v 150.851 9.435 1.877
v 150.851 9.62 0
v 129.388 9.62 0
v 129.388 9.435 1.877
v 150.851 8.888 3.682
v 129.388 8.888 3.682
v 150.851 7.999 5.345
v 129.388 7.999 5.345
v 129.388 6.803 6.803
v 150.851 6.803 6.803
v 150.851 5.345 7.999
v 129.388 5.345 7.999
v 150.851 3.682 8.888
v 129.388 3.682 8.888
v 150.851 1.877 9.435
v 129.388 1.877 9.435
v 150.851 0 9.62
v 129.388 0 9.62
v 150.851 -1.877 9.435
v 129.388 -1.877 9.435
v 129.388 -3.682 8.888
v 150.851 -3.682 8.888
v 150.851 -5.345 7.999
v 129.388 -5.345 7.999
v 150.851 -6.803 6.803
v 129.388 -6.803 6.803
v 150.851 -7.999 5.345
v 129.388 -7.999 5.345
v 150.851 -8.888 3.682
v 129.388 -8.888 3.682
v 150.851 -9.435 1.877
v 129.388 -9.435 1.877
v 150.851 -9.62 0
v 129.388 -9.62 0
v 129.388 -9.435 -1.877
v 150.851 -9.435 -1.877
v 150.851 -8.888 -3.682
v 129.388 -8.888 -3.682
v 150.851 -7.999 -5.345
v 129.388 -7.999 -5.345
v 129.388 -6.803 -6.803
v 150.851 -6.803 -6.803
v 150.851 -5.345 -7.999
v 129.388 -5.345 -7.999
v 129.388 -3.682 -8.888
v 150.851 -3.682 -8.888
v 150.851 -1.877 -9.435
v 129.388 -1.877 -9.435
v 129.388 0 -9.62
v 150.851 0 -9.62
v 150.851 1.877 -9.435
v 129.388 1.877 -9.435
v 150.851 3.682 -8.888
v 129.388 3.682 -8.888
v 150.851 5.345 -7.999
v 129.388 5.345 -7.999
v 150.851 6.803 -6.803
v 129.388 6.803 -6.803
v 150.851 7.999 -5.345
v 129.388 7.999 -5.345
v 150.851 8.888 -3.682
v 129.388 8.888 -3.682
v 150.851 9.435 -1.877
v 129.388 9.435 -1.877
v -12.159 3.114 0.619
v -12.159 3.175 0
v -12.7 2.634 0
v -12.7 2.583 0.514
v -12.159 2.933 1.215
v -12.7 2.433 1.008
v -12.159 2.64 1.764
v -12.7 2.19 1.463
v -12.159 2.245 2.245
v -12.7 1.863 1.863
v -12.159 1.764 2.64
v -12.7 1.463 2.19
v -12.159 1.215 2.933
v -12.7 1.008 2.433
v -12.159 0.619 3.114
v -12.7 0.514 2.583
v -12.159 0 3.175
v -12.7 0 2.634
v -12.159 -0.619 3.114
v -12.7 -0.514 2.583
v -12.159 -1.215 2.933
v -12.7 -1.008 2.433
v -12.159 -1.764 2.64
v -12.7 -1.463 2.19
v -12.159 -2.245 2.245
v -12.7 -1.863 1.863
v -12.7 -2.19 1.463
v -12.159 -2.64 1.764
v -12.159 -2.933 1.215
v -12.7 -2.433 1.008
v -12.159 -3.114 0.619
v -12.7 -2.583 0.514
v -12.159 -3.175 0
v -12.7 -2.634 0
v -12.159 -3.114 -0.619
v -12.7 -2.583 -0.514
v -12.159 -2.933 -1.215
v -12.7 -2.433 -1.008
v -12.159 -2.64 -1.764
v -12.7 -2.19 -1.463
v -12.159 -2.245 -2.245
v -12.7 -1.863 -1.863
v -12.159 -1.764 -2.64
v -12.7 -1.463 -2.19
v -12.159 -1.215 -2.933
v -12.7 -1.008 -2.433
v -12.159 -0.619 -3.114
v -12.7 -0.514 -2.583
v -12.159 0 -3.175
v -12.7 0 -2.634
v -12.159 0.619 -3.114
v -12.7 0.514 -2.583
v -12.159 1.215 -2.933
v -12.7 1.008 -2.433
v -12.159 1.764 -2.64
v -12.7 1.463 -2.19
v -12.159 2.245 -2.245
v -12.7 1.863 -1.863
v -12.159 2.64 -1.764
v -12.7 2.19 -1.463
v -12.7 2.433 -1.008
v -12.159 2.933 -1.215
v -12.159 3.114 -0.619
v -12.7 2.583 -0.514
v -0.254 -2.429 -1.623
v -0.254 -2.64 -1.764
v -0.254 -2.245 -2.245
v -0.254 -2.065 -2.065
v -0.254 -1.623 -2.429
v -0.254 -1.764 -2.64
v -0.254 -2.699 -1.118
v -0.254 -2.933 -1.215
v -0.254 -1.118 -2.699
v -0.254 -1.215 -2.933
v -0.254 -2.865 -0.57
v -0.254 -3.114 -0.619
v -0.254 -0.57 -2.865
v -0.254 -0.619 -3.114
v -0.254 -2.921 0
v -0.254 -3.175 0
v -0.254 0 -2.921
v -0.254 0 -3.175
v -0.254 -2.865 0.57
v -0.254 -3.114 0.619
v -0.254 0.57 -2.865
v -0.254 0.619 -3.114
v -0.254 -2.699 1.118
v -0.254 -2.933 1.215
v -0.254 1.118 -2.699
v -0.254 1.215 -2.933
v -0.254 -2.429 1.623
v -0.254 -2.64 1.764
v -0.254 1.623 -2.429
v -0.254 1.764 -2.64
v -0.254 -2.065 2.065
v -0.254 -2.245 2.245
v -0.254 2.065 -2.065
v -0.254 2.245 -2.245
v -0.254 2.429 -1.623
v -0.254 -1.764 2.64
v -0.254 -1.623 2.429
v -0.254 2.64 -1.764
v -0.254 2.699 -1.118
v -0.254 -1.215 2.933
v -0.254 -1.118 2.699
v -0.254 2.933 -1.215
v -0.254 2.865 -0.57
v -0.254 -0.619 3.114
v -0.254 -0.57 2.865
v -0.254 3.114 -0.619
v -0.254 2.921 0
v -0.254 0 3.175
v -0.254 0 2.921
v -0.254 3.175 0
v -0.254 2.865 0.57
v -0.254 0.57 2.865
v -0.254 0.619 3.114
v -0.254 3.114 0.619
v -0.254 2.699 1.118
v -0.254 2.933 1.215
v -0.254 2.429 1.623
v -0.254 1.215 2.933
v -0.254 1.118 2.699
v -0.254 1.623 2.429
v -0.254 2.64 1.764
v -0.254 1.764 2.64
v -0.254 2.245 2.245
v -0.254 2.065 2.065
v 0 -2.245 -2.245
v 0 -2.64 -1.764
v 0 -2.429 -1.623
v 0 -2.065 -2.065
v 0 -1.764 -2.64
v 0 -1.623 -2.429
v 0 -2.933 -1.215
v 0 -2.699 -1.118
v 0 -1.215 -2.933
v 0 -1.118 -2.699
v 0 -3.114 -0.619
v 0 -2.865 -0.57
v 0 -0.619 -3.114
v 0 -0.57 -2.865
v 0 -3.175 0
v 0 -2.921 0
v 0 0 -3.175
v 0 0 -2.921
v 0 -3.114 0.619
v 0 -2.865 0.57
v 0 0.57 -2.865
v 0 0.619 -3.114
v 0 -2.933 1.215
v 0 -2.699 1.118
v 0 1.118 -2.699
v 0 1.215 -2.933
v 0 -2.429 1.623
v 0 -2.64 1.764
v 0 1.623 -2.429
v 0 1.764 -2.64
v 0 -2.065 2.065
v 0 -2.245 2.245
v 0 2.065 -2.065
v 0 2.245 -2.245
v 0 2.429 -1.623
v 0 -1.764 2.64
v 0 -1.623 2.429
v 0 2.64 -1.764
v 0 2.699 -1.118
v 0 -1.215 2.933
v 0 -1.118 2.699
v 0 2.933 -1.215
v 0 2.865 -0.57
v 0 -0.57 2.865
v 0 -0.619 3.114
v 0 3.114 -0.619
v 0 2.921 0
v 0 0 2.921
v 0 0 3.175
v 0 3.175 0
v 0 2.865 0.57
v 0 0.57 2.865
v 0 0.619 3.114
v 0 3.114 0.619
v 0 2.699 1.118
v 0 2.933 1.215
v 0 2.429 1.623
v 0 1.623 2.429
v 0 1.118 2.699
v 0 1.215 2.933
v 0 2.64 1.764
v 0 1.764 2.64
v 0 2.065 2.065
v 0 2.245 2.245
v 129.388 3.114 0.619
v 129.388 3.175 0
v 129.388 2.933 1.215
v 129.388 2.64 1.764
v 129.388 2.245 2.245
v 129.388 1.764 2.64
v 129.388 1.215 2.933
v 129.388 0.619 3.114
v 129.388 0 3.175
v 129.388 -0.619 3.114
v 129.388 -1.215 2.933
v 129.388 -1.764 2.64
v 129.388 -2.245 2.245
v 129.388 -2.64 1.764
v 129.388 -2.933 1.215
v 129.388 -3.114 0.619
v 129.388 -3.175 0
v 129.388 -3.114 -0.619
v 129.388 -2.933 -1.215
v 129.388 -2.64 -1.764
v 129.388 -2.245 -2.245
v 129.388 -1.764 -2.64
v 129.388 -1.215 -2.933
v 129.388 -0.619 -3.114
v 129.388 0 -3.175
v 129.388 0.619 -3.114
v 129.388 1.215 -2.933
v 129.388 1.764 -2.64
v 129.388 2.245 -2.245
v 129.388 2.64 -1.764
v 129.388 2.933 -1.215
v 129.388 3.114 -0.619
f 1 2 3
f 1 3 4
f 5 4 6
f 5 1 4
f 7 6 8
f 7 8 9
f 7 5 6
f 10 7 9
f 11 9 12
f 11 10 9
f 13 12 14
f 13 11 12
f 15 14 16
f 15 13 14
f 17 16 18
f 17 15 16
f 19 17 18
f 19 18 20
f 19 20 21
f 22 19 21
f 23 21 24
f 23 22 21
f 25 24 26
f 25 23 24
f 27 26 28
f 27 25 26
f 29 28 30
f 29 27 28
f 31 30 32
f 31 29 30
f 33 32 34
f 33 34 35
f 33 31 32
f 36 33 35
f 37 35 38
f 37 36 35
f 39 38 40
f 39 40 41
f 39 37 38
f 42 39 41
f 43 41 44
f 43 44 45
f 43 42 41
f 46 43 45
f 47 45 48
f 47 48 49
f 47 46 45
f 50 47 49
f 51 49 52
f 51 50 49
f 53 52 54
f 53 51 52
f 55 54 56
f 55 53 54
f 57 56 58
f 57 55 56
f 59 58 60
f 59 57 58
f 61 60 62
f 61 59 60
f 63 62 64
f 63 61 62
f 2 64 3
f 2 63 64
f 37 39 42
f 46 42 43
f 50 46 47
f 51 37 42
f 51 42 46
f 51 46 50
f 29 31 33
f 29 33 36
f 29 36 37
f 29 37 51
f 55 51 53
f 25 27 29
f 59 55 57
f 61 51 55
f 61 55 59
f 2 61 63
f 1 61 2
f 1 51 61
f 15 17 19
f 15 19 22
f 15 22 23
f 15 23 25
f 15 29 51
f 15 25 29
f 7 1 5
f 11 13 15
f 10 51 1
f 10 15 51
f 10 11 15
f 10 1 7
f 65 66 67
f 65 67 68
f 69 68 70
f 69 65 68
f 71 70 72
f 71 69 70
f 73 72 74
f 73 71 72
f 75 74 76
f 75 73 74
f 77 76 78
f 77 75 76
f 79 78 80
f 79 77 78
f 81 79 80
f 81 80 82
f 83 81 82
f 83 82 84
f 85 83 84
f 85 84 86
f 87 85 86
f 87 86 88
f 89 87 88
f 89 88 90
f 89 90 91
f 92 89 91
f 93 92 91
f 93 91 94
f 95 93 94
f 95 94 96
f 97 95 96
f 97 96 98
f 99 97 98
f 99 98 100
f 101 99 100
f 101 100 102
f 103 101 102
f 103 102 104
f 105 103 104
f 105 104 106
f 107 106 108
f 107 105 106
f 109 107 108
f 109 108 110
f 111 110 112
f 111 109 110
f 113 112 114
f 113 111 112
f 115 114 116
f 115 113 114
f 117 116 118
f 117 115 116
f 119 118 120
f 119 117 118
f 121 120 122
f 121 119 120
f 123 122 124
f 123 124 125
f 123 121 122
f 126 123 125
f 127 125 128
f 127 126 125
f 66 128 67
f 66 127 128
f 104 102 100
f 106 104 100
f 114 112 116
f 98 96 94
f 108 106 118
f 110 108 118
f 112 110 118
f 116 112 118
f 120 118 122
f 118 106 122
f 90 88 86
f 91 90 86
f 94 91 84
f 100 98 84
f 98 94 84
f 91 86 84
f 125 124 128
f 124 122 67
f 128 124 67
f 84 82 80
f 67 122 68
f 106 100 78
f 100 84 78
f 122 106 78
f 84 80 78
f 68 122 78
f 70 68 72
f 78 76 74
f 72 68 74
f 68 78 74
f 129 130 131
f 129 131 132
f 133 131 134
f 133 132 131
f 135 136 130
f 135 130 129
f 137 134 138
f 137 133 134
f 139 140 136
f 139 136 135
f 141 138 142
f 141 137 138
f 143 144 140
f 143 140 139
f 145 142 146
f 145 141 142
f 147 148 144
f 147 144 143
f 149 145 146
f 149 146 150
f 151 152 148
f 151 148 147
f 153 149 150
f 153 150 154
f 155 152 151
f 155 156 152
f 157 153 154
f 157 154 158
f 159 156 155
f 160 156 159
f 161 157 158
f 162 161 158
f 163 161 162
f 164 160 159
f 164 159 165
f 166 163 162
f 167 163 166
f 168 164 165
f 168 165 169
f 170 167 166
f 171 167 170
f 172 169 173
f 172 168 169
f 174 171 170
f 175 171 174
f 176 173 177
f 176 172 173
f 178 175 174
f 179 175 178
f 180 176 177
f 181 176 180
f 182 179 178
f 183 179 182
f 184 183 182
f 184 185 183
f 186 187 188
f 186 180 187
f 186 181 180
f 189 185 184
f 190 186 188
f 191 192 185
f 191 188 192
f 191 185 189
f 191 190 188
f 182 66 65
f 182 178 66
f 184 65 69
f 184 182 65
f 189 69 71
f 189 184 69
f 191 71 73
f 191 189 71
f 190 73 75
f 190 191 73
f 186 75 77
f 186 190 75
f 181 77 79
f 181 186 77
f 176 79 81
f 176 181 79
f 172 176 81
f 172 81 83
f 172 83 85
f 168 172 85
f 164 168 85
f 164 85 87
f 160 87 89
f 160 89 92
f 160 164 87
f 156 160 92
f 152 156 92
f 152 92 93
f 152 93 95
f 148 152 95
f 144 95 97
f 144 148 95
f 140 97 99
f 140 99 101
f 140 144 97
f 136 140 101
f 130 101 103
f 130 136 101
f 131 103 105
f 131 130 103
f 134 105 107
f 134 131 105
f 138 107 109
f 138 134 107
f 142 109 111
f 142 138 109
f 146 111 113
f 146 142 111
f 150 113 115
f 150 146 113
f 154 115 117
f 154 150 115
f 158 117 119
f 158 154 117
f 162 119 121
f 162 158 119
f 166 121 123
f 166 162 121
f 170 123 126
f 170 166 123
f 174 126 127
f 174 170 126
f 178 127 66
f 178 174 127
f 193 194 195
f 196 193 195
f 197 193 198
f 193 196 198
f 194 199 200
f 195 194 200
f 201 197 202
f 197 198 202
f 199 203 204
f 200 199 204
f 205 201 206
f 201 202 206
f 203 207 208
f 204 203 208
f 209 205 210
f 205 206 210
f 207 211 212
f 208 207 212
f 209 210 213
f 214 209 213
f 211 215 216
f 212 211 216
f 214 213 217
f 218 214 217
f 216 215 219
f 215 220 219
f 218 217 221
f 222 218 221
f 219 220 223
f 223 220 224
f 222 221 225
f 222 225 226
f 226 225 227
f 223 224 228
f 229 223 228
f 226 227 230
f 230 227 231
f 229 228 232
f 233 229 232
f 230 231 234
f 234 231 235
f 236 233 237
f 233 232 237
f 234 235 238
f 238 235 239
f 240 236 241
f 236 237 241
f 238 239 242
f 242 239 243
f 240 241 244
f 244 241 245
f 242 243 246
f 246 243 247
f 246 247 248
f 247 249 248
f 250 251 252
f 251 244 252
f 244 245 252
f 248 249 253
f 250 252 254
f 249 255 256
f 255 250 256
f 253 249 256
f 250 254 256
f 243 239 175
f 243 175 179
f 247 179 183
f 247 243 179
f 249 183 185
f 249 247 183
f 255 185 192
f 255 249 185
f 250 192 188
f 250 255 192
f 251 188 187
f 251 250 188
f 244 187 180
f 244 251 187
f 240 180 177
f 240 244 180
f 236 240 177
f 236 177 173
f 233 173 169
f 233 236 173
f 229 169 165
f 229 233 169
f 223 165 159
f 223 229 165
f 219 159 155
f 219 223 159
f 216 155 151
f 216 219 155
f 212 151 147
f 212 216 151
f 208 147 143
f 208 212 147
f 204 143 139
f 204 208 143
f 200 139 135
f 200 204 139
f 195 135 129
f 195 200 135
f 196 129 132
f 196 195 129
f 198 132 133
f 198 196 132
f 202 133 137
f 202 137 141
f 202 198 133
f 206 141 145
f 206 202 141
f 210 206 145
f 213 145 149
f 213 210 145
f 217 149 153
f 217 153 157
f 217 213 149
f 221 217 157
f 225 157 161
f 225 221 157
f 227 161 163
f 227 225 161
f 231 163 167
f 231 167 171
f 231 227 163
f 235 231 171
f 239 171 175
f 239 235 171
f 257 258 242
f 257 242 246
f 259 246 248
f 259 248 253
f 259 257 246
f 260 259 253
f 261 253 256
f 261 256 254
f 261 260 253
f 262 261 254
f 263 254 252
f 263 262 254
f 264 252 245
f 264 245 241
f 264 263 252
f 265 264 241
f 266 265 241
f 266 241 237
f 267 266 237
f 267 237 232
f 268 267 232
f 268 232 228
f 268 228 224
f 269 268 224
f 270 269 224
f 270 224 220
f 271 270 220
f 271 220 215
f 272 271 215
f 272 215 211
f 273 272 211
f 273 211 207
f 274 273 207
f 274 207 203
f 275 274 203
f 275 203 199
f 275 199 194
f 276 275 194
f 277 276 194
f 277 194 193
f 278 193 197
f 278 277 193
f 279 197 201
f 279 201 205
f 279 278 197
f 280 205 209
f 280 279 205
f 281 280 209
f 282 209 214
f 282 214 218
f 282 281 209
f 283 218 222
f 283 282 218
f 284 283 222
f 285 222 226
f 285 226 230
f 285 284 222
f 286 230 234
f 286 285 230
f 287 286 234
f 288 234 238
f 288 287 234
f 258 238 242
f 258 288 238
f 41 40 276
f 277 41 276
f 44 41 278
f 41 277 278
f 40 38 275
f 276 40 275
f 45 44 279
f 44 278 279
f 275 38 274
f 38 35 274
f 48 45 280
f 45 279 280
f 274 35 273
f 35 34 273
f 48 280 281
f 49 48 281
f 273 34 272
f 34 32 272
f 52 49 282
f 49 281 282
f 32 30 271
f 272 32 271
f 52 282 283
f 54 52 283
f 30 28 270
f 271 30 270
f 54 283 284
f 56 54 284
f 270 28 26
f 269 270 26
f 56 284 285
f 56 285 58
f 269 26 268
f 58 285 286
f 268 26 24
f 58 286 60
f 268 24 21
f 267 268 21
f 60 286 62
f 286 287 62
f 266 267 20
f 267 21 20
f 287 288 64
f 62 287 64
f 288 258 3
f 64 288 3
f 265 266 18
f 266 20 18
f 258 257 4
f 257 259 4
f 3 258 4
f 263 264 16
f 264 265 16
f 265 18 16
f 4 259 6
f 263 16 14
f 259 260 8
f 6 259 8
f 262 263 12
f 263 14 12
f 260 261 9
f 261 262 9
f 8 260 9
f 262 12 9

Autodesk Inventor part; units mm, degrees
sketch "Sketch_1" plane through (0, 0, 0) normal (0, 0, 1) x (1, 0, 0)
  line L0 (150.8506, 0) -> (0, 0)
  line L1 (0, 0) -> (0, 3.175)
  line L2 (0, 3.175) -> (129.3876, 3.175)
  line L3 (129.3876, 3.175) -> (129.3876, 9.6203)
  line L4 (129.3876, 9.6203) -> (150.8506, 9.6203)
  line L5 (150.8506, 9.6203) -> (150.8506, 0)
  line L6 (150.8506, 0) -> (0, 0)
revolve "Revolution1" add sketch "Sketch_1" angle 360 about axis through (150.8506, 0, 0) along (1, 0, 0)
sketch "Sketch_3" plane through (0, 0, 0) normal (0, 0, 1) x (1, 0, 0)
  line L0 (0, 0) -> (-12.7, 0)
  line L1 (-12.7, 0) -> (-12.7, 2.634)
  line L2 (-12.7, 2.634) -> (-12.159, 3.175)
  line L3 (-12.159, 3.175) -> (0, 3.175)
  line L4 (0, 3.175) -> (0, 0)
  line L5 (0, 0) -> (-12.7, 0)
revolve "Revolution2" add sketch "Sketch_3" angle 360 about axis through (0, 0, 0) along (1, 0, 0)
thread "Thread1" size "1/4-28 UNF" class "3A" standard "ANSI Unified Screw Threads" length 12.7 offset 129.3876
sketch "Sketch_30" plane through (0, 0, 0) normal (0, 0, 1) x (1, 0, 0)
  line L0 (0, 0) -> (-0.254, 0)
  line L1 (-0.254, 3.429) -> (-0.254, 2.921)
  line L2 (-0.254, 2.921) -> (0, 2.921)
  line L3 (0, 2.921) -> (0, 3.429)
  line L4 (0, 3.429) -> (-0.254, 3.429)
revolve "Revolution3" cut sketch "Sketch_30" angle 360 about axis through (0, 0, 0) along (1, 0, 0)
ref_plane "rod_cp_XY" through (0, 0, 0) normal (1, 0, 0) x (0, 0, -1)
ref_plane "rod_cp_YZ" through (0, 0, 0) normal (0, 0, -1) x (0, 1, 0)
ref_plane "rod_cp_ZX" through (0, 0, 0) normal (0, 1, 0) x (1, 0, 0)
ref_plane "to_rod_clevis_XY" through (-12.7, 0, 0) normal (1, 0, 0) x (0, 0, -1)
ref_plane "to_rod_clevis_YZ" through (-12.7, 0, 0) normal (0, 0, -1) x (0, 1, 0)
ref_plane "to_rod_clevis_ZX" through (-12.7, 0, 0) normal (0, 1, 0) x (1, 0, 0)
ref_plane "rl2_XY" through (0, 0, 0) normal (1, 0, 0) x (0, 0, -1)
ref_plane "rl2_YZ" through (0, 0, 0) normal (0, 0, -1) x (0, 1, 0)
ref_plane "rl2_ZX" through (0, 0, 0) normal (0, 1, 0) x (1, 0, 0)
ref_plane "rl1_XY" through (-12.7, 0, 0) normal (1, 0, 0) x (0, 0, -1)
ref_plane "rl1_YZ" through (-12.7, 0, 0) normal (0, 0, -1) x (0, 1, 0)
ref_plane "rl1_ZX" through (-12.7, 0, 0) normal (0, 1, 0) x (1, 0, 0)
ref_plane "thd1_XY" through (-12.7, 3.175, 0) normal (1, 0, 0) x (0, 0, -1)
ref_plane "thd1_YZ" through (-12.7, 3.175, 0) normal (0, 0, -1) x (0, 1, 0)
ref_plane "thd1_ZX" through (-12.7, 3.175, 0) normal (0, 1, 0) x (1, 0, 0)
ref_plane "thd2_XY" through (-12.7, -3.175, 0) normal (1, 0, 0) x (0, 0, -1)
ref_plane "thd2_YZ" through (-12.7, -3.175, 0) normal (0, 0, -1) x (0, 1, 0)
ref_plane "thd2_ZX" through (-12.7, -3.175, 0) normal (0, 1, 0) x (1, 0, 0)
ref_plane "dia1_XY" through (0, 3.175, 0) normal (1, 0, 0) x (0, 0, -1)
ref_plane "dia1_YZ" through (0, 3.175, 0) normal (0, 0, -1) x (0, 1, 0)
ref_plane "dia1_ZX" through (0, 3.175, 0) normal (0, 1, 0) x (1, 0, 0)
ref_plane "dia2_XY" through (0, -3.175, 0) normal (1, 0, 0) x (0, 0, -1)
ref_plane "dia2_YZ" through (0, -3.175, 0) normal (0, 0, -1) x (0, 1, 0)
ref_plane "dia2_ZX" through (0, -3.175, 0) normal (0, 1, 0) x (1, 0, 0)
ref_plane "dia1r_XY" through (0, 0, 10.2235) normal (1, 0, 0) x (0, 0, -1)
ref_plane "dia1r_YZ" through (0, 0, 10.2235) normal (0, 0, -1) x (0, 1, 0)
ref_plane "dia1r_ZX" through (0, 0, 10.2235) normal (0, 1, 0) x (1, 0, 0)
ref_plane "dia2r_XY" through (0, 0, -10.2235) normal (1, 0, 0) x (0, 0, -1)
ref_plane "dia2r_YZ" through (0, 0, -10.2235) normal (0, 0, -1) x (0, 1, 0)
ref_plane "dia2r_ZX" through (0, 0, -10.2235) normal (0, 1, 0) x (1, 0, 0)
ref_plane "dia12_XY" through (0, 0, 10.9537) normal (1, 0, 0) x (0, 0, -1)
ref_plane "dia12_YZ" through (0, 0, 10.9537) normal (0, 0, -1) x (0, 1, 0)
ref_plane "dia12_ZX" through (0, 0, 10.9537) normal (0, 1, 0) x (1, 0, 0)
ref_plane "dia22_XY" through (0, 0, -10.9537) normal (1, 0, 0) x (0, 0, -1)
ref_plane "dia22_YZ" through (0, 0, -10.9537) normal (0, 0, -1) x (0, 1, 0)
ref_plane "dia22_ZX" through (0, 0, -10.9537) normal (0, 1, 0) x (1, 0, 0)
properties part number "043.5-DQ0_rod"
